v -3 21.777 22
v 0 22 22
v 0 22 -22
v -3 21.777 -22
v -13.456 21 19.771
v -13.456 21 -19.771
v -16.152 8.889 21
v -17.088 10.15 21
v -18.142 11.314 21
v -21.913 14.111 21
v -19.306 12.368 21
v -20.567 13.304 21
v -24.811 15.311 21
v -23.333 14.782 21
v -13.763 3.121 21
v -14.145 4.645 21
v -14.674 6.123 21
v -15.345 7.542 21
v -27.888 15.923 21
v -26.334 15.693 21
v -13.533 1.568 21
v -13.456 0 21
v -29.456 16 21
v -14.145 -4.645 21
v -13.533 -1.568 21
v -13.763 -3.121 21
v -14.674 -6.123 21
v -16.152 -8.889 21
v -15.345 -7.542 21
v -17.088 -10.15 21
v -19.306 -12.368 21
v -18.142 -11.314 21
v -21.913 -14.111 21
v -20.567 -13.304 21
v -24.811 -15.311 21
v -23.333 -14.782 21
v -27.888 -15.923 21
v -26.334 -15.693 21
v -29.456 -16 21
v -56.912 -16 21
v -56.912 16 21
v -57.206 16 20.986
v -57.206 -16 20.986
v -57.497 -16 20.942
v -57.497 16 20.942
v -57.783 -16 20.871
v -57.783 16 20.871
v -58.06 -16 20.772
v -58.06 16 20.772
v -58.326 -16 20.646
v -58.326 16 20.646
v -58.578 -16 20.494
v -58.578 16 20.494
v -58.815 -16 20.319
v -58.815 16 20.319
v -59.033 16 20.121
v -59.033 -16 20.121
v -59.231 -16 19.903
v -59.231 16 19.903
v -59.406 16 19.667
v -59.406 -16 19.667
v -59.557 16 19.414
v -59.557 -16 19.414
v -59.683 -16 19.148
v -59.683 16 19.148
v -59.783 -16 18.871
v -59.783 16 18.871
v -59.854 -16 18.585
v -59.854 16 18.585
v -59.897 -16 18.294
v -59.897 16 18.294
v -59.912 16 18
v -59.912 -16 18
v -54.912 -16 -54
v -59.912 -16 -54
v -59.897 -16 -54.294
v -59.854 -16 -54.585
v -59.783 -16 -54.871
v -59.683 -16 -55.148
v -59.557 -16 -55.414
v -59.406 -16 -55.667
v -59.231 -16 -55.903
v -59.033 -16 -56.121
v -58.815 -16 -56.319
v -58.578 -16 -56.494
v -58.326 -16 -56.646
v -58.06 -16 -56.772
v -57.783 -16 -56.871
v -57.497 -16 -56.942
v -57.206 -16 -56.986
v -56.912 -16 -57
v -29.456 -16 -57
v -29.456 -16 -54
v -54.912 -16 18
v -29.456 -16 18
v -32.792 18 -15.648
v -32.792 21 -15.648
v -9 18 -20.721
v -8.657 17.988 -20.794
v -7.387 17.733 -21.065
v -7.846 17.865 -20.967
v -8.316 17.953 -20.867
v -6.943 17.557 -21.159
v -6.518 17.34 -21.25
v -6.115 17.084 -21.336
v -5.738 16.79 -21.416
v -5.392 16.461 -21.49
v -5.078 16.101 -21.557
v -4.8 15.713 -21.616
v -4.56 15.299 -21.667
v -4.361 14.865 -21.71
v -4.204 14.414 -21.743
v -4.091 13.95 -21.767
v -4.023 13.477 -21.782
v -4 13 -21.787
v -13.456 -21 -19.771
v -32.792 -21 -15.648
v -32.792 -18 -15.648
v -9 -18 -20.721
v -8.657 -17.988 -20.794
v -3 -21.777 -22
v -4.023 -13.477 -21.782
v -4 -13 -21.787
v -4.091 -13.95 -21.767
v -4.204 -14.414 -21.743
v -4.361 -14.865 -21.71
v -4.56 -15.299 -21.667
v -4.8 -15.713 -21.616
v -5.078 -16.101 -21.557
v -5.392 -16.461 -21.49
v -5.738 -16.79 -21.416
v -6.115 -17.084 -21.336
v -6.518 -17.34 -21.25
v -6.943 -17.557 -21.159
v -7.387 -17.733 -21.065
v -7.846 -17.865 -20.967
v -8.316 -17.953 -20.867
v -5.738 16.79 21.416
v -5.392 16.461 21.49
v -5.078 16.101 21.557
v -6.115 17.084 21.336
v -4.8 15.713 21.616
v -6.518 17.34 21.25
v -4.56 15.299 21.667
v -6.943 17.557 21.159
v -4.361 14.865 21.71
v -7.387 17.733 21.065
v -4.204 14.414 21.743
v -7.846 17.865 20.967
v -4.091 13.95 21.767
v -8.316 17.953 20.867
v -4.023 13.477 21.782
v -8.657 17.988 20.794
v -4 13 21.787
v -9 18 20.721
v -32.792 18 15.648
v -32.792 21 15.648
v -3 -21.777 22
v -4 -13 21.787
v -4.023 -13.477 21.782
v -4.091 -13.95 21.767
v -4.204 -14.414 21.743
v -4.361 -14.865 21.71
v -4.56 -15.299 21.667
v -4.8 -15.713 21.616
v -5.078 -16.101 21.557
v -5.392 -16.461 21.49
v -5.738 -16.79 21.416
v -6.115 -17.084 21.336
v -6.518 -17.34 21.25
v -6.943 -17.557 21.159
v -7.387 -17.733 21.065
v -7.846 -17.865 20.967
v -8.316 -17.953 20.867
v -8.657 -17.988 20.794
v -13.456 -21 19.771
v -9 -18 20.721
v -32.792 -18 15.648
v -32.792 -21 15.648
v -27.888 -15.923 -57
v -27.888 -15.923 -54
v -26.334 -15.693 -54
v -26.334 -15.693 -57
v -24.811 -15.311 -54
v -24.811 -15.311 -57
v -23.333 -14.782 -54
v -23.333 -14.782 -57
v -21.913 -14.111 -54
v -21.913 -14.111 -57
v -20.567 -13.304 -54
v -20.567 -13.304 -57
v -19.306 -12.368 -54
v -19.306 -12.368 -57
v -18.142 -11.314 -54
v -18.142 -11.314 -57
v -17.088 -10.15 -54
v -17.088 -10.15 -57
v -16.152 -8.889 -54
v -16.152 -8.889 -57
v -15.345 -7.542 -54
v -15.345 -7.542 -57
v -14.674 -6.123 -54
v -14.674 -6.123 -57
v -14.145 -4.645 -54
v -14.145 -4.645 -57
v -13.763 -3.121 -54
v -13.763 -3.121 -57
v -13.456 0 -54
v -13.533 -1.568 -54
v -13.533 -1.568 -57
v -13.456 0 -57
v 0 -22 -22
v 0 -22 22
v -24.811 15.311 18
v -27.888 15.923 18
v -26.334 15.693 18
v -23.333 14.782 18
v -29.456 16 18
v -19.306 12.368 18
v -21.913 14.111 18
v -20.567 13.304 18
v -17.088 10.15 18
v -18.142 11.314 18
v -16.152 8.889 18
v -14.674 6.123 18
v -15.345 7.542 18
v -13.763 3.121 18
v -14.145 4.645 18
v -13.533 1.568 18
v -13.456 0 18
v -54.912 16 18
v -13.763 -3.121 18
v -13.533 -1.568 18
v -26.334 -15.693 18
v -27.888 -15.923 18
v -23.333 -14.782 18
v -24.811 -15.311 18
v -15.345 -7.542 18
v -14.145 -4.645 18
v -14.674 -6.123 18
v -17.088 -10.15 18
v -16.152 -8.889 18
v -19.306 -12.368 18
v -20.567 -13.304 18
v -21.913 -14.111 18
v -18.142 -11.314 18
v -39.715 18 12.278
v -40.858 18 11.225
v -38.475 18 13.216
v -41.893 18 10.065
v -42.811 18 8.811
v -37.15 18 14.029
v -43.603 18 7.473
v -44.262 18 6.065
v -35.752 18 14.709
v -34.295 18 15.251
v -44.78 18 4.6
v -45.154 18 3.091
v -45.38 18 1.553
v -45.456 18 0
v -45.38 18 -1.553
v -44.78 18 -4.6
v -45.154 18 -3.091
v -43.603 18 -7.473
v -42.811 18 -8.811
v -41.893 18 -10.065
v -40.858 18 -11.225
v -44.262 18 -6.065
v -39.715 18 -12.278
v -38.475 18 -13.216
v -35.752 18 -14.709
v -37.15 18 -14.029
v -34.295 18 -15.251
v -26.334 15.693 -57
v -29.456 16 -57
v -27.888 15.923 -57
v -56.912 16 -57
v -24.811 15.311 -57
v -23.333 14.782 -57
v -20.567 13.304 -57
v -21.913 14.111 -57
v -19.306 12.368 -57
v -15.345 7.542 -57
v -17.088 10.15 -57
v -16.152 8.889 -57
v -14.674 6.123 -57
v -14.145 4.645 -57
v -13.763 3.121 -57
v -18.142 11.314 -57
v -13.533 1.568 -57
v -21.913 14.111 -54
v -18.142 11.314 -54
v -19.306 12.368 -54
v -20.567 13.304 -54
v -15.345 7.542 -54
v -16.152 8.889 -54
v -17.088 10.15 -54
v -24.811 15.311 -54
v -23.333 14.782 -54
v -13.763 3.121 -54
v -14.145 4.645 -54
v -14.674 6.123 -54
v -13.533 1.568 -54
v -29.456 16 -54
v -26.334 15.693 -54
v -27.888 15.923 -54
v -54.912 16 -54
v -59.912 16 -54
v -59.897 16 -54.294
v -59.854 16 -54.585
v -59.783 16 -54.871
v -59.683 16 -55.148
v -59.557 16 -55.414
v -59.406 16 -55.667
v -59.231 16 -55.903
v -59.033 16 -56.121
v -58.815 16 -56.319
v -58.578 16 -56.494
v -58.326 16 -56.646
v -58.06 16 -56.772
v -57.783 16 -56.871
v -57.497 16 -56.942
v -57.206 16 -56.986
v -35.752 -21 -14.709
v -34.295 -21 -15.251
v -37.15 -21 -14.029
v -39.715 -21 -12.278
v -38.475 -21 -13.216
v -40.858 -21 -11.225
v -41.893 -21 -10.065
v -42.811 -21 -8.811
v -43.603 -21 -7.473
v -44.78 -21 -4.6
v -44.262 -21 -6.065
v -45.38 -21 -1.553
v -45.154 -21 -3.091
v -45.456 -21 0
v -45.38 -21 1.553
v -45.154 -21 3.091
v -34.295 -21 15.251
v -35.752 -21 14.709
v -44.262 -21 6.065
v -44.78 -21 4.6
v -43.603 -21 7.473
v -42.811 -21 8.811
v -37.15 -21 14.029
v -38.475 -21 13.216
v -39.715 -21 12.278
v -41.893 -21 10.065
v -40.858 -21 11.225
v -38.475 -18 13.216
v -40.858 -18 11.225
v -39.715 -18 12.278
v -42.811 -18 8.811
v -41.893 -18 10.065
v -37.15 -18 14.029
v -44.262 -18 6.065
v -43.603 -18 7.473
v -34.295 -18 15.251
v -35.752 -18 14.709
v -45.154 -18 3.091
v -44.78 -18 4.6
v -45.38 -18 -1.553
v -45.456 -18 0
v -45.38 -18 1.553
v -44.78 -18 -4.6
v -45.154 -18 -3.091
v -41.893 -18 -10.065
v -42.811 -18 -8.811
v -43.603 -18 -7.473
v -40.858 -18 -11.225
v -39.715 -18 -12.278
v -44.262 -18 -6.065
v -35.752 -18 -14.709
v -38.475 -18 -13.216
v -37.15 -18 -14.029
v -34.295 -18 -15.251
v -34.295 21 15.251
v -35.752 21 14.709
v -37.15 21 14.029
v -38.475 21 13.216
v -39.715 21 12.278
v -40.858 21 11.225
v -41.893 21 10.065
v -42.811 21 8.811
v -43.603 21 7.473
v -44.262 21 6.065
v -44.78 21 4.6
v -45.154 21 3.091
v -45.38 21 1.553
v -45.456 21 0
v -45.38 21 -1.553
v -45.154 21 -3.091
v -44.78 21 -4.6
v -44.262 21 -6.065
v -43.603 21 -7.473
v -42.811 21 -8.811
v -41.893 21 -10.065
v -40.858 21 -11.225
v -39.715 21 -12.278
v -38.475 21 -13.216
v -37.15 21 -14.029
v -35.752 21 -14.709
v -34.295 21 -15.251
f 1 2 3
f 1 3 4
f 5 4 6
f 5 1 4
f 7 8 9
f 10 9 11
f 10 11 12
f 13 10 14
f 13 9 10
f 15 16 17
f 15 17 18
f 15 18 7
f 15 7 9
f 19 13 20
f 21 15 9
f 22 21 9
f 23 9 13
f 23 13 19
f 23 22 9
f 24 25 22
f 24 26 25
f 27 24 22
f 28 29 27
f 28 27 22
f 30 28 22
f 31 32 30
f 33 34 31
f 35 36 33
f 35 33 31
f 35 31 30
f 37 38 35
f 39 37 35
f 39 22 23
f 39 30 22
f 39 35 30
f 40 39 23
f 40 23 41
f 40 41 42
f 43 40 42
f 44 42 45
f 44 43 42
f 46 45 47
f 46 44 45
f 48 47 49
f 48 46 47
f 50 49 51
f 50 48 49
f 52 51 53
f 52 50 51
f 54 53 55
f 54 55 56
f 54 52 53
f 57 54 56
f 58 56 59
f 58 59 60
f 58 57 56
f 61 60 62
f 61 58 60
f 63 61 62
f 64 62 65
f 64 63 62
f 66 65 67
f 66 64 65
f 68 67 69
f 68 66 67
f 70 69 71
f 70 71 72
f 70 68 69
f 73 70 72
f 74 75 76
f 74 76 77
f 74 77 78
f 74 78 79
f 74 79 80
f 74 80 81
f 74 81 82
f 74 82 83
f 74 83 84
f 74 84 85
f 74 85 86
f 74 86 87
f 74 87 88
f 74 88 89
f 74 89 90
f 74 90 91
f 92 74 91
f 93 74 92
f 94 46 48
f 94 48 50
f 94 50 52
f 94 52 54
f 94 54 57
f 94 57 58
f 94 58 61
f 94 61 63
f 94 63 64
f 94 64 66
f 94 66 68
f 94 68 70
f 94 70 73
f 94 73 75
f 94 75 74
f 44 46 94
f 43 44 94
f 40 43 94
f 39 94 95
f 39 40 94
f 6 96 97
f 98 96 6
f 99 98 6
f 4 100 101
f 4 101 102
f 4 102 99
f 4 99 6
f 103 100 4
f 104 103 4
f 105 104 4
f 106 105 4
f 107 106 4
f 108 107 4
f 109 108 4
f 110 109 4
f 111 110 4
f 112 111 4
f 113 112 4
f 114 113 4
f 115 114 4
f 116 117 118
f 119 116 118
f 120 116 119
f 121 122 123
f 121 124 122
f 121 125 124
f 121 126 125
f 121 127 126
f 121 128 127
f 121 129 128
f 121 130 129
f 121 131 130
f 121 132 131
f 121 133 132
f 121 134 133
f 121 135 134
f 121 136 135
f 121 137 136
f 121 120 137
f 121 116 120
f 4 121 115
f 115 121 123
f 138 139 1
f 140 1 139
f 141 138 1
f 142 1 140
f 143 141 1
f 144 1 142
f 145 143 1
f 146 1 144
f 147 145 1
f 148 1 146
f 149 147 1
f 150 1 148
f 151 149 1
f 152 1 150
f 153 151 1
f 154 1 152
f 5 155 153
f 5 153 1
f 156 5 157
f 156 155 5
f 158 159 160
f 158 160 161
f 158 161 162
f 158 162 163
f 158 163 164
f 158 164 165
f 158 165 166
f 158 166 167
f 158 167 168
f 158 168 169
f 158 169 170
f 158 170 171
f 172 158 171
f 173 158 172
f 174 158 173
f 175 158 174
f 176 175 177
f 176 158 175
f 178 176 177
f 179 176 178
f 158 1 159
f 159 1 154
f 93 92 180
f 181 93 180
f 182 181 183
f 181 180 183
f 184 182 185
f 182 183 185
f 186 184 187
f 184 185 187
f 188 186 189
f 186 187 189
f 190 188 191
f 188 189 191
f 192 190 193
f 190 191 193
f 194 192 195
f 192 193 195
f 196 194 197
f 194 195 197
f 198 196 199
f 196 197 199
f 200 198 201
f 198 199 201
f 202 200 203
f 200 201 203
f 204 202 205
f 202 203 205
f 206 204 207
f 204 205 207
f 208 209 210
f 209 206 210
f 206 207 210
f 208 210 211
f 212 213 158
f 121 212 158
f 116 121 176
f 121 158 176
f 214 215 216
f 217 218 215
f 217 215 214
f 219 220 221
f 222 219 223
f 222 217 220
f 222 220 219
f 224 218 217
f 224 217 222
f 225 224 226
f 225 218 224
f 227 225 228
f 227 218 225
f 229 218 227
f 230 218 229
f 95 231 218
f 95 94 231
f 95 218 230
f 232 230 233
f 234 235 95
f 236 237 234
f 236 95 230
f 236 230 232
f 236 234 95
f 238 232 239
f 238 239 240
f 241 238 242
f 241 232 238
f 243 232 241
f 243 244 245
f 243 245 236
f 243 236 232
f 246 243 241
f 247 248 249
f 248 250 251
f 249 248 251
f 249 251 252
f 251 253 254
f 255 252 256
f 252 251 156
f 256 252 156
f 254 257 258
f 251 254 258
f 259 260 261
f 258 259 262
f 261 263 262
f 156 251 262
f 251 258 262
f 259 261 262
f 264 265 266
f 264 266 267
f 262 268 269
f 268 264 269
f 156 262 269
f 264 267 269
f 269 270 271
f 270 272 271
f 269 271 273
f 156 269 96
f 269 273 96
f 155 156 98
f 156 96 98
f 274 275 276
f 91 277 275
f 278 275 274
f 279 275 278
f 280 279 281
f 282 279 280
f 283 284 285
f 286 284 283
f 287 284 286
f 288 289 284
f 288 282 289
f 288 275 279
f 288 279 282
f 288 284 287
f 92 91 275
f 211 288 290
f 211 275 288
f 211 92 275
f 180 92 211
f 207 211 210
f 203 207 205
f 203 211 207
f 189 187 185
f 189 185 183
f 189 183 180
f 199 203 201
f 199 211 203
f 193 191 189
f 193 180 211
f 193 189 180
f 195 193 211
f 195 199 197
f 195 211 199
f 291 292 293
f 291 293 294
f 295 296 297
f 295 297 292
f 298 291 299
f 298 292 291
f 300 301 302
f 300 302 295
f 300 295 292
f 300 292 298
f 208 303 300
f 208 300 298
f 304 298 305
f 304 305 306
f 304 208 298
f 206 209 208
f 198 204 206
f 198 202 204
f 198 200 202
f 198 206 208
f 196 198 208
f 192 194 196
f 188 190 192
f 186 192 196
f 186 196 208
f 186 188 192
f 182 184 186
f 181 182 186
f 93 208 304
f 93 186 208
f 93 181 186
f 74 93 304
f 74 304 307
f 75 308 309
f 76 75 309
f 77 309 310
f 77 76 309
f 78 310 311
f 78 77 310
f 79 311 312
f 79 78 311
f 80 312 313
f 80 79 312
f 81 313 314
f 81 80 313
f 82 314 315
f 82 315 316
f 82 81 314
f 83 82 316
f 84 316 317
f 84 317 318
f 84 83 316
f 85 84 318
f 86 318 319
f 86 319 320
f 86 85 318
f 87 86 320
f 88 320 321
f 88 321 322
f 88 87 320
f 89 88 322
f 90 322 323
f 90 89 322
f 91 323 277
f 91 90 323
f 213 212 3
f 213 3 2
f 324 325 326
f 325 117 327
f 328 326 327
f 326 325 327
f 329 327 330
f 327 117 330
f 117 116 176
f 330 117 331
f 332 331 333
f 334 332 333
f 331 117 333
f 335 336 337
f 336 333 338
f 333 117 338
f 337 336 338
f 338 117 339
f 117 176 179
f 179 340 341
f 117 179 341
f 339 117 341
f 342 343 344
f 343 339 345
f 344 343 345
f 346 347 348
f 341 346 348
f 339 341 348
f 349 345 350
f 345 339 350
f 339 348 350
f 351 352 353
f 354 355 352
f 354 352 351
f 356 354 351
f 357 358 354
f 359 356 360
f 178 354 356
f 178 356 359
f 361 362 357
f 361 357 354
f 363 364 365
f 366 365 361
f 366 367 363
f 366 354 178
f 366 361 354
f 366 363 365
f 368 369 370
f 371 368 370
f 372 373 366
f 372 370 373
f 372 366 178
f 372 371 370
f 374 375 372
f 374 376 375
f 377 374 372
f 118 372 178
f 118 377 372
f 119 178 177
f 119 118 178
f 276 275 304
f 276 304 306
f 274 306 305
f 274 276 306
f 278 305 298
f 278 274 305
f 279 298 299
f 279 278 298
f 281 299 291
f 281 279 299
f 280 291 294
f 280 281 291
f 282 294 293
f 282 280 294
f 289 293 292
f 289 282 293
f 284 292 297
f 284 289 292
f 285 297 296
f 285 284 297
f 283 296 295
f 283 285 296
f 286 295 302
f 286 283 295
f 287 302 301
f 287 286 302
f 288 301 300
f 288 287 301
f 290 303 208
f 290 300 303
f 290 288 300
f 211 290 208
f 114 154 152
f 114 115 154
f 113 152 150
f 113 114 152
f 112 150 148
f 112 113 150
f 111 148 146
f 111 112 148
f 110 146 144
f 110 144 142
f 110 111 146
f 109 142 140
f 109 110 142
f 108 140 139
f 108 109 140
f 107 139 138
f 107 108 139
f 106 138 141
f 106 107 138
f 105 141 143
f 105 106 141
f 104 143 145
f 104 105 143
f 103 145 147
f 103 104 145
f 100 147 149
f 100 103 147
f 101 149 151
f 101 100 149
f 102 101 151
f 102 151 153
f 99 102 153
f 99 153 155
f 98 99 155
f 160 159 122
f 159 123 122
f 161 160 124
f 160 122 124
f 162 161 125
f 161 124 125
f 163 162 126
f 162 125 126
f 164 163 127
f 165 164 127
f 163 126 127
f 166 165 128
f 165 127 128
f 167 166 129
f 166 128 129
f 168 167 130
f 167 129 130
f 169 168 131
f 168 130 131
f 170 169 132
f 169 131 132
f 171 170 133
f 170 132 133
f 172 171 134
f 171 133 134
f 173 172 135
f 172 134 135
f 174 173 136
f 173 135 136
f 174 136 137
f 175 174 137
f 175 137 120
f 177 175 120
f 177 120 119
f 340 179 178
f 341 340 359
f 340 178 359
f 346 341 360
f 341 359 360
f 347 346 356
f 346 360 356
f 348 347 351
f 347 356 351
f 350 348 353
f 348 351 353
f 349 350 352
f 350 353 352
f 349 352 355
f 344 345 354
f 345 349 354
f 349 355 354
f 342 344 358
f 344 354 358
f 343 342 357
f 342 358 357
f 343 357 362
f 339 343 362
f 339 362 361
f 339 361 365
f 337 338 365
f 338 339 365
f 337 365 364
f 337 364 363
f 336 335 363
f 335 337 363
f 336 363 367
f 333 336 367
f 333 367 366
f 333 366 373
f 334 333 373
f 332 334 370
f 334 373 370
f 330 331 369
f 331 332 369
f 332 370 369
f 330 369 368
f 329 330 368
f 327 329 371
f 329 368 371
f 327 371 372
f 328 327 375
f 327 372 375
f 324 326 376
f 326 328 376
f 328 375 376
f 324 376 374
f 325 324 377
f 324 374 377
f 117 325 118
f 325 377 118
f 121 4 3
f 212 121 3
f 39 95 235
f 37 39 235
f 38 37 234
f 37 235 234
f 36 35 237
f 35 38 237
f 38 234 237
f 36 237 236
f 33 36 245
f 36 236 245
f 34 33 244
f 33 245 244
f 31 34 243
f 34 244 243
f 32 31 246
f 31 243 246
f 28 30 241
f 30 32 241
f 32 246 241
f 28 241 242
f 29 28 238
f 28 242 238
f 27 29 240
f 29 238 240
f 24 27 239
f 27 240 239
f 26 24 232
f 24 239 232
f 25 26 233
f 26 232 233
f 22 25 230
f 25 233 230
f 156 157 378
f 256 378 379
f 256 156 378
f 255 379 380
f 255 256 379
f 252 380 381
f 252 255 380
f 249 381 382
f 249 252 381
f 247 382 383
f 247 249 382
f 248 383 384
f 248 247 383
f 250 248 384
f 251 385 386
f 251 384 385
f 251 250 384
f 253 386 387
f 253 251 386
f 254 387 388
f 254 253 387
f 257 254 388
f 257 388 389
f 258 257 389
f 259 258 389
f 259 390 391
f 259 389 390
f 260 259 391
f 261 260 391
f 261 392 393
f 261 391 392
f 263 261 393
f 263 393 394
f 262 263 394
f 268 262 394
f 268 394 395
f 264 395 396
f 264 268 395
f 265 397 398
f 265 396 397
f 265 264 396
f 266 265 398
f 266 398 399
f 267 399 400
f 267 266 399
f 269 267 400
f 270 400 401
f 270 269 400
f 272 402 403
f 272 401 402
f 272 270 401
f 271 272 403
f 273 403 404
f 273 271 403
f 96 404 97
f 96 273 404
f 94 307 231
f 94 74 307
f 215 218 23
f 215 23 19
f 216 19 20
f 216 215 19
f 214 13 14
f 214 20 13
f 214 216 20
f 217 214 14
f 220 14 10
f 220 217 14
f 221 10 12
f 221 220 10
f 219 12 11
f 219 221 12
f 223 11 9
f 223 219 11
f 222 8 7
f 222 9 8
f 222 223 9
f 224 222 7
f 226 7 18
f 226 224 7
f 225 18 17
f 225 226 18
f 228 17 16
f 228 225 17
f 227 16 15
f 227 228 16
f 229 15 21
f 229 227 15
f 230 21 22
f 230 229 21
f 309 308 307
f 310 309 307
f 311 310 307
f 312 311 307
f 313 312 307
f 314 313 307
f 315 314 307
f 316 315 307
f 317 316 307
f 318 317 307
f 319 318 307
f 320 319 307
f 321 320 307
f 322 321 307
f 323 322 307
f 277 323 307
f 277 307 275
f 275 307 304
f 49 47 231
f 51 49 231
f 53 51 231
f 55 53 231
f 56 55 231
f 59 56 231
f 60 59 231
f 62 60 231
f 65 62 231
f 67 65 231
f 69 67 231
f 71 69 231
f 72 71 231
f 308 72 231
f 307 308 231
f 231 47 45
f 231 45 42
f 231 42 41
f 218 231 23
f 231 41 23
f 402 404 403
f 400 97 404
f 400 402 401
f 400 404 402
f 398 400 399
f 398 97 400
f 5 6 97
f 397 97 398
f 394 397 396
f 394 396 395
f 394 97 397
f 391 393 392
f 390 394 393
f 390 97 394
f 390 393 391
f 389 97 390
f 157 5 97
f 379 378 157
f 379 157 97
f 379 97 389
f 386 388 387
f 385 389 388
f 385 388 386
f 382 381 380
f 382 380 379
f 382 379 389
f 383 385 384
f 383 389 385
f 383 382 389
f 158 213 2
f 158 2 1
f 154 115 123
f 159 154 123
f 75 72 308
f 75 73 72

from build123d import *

# Parameters (mm, degrees)
F2_DEPTH      = 22
F3_W          = 43.4558441227
F3_H          = 18
F4_DEPTH      = 22.001
F4_DEPTH_BACK = 25
F5_R          = 5
F7_DEPTH      = 16
F9_START      = -57.001
F9_DEPTH      = 79.002


with BuildPart() as f2:
    # F1 (on Front) → F2 (new body)
    with BuildSketch(Plane.XZ):
        with BuildLine():
            ThreePointArc((-32.792074557, -15.6483087421), (-19.390549466, -12.4374371747), (-13.4558441227, 0))
            ThreePointArc((-13.4558441227, 0), (-19.390549466, 12.4374371747), (-32.792074557, 15.6483087421))
            ThreePointArc((-32.792074557, 15.6483087421), (-45.4558441227, 0), (-32.792074557, -15.6483087421))
        make_face()
        with BuildLine():
            ThreePointArc((-32.792074557, 15.6483087421), (-19.390549466, 12.4374371747), (-13.4558441227, 0))
            ThreePointArc((-13.4558441227, 0), (-19.390549466, -12.4374371747), (-32.792074557, -15.6483087421))
            Line((-32.792074557, -15.6483087421), (-3, -22))
            Line((-3, -22), (0, -22))
            Line((0, -22), (0, 22))
            Line((0, 22), (-3, 22))
            Line((-3, 22), (-32.792074557, 15.6483087421))
        make_face()
    extrude(amount=F2_DEPTH)

    # F3 (on Top) → F4 (cut, two sides)
    with BuildSketch(Plane.XY) as f4_sk:
        with Locations((-25.7279220614, -9)):
            Rectangle(F3_W, F3_H)
        Polygon((-13.4558441227, -21), (-47.4558441227, -21), (-47.4558441227, -22), (0, -22), align=None)
    extrude(amount=-F4_DEPTH, mode=Mode.SUBTRACT)
    extrude(f4_sk.sketch, amount=F4_DEPTH_BACK, mode=Mode.SUBTRACT)

    # F5
    f5_edges = [f2.edges().sort_by_distance(p)[0] for p in [
        (-4, -18, 0),
    ]]
    fillet(f5_edges, radius=F5_R)



with BuildPart() as f7:
    # F6 (on Front) → F7 (new body)
    with BuildSketch(Plane.XZ):
        with BuildLine():
            Line((-54.9116882454, 18), (-13.4558441227, 18))
            Line((-13.4558441227, 18), (-13.4558441227, 21))
            Line((-13.4558441227, 21), (-56.9116882454, 21))
            ThreePointArc((-56.9116882454, 21), (-59.033008589, 20.1213203436), (-59.9116882454, 18))
            Line((-59.9116882454, 18), (-59.9116882454, -54))
            ThreePointArc((-59.9116882454, -54), (-59.033008589, -56.1213203436), (-56.9116882454, -57))
            Line((-56.9116882454, -57), (-13.4558441227, -57))
            Line((-13.4558441227, -57), (-13.4558441227, -54))
            Line((-13.4558441227, -54), (-54.9116882454, -54))
            Line((-54.9116882454, -54), (-54.9116882454, 18))
        make_face()
    extrude(amount=F7_DEPTH)

    # F8 (on Top) → F9 (intersect)
    with BuildSketch(Plane.XY.offset(F9_START)):
        with BuildLine():
            ThreePointArc((-29.4558441227, -16), (-18.1421356237, -11.313708499), (-13.4558441227, 0))
            ThreePointArc((-13.4558441227, 0), (-29.4558441227, 16), (-45.4558441227, 0))
            ThreePointArc((-45.4558441227, 0), (-40.7695526217, -11.313708499), (-29.4558441227, -16))
        make_face()
        with BuildLine():
            ThreePointArc((-29.4558441227, -16), (-40.7695526217, -11.313708499), (-45.4558441227, 0))
            Line((-45.4558441227, 0), (-59.9116882454, 0))
            Line((-59.9116882454, 0), (-59.9116882454, -16))
            Line((-59.9116882454, -16), (-29.4558441227, -16))
        make_face()
    extrude(amount=F9_DEPTH, mode=Mode.INTERSECT)


with BuildPart() as f2_1:
    add(f2.part)

    add(f7.part)  # F10 merges F7
    # F10: F2, F7 across plane
    add(f2.part.mirror(Plane.XZ))
    add(f7.part.mirror(Plane.XZ))


solid = f2_1.part
